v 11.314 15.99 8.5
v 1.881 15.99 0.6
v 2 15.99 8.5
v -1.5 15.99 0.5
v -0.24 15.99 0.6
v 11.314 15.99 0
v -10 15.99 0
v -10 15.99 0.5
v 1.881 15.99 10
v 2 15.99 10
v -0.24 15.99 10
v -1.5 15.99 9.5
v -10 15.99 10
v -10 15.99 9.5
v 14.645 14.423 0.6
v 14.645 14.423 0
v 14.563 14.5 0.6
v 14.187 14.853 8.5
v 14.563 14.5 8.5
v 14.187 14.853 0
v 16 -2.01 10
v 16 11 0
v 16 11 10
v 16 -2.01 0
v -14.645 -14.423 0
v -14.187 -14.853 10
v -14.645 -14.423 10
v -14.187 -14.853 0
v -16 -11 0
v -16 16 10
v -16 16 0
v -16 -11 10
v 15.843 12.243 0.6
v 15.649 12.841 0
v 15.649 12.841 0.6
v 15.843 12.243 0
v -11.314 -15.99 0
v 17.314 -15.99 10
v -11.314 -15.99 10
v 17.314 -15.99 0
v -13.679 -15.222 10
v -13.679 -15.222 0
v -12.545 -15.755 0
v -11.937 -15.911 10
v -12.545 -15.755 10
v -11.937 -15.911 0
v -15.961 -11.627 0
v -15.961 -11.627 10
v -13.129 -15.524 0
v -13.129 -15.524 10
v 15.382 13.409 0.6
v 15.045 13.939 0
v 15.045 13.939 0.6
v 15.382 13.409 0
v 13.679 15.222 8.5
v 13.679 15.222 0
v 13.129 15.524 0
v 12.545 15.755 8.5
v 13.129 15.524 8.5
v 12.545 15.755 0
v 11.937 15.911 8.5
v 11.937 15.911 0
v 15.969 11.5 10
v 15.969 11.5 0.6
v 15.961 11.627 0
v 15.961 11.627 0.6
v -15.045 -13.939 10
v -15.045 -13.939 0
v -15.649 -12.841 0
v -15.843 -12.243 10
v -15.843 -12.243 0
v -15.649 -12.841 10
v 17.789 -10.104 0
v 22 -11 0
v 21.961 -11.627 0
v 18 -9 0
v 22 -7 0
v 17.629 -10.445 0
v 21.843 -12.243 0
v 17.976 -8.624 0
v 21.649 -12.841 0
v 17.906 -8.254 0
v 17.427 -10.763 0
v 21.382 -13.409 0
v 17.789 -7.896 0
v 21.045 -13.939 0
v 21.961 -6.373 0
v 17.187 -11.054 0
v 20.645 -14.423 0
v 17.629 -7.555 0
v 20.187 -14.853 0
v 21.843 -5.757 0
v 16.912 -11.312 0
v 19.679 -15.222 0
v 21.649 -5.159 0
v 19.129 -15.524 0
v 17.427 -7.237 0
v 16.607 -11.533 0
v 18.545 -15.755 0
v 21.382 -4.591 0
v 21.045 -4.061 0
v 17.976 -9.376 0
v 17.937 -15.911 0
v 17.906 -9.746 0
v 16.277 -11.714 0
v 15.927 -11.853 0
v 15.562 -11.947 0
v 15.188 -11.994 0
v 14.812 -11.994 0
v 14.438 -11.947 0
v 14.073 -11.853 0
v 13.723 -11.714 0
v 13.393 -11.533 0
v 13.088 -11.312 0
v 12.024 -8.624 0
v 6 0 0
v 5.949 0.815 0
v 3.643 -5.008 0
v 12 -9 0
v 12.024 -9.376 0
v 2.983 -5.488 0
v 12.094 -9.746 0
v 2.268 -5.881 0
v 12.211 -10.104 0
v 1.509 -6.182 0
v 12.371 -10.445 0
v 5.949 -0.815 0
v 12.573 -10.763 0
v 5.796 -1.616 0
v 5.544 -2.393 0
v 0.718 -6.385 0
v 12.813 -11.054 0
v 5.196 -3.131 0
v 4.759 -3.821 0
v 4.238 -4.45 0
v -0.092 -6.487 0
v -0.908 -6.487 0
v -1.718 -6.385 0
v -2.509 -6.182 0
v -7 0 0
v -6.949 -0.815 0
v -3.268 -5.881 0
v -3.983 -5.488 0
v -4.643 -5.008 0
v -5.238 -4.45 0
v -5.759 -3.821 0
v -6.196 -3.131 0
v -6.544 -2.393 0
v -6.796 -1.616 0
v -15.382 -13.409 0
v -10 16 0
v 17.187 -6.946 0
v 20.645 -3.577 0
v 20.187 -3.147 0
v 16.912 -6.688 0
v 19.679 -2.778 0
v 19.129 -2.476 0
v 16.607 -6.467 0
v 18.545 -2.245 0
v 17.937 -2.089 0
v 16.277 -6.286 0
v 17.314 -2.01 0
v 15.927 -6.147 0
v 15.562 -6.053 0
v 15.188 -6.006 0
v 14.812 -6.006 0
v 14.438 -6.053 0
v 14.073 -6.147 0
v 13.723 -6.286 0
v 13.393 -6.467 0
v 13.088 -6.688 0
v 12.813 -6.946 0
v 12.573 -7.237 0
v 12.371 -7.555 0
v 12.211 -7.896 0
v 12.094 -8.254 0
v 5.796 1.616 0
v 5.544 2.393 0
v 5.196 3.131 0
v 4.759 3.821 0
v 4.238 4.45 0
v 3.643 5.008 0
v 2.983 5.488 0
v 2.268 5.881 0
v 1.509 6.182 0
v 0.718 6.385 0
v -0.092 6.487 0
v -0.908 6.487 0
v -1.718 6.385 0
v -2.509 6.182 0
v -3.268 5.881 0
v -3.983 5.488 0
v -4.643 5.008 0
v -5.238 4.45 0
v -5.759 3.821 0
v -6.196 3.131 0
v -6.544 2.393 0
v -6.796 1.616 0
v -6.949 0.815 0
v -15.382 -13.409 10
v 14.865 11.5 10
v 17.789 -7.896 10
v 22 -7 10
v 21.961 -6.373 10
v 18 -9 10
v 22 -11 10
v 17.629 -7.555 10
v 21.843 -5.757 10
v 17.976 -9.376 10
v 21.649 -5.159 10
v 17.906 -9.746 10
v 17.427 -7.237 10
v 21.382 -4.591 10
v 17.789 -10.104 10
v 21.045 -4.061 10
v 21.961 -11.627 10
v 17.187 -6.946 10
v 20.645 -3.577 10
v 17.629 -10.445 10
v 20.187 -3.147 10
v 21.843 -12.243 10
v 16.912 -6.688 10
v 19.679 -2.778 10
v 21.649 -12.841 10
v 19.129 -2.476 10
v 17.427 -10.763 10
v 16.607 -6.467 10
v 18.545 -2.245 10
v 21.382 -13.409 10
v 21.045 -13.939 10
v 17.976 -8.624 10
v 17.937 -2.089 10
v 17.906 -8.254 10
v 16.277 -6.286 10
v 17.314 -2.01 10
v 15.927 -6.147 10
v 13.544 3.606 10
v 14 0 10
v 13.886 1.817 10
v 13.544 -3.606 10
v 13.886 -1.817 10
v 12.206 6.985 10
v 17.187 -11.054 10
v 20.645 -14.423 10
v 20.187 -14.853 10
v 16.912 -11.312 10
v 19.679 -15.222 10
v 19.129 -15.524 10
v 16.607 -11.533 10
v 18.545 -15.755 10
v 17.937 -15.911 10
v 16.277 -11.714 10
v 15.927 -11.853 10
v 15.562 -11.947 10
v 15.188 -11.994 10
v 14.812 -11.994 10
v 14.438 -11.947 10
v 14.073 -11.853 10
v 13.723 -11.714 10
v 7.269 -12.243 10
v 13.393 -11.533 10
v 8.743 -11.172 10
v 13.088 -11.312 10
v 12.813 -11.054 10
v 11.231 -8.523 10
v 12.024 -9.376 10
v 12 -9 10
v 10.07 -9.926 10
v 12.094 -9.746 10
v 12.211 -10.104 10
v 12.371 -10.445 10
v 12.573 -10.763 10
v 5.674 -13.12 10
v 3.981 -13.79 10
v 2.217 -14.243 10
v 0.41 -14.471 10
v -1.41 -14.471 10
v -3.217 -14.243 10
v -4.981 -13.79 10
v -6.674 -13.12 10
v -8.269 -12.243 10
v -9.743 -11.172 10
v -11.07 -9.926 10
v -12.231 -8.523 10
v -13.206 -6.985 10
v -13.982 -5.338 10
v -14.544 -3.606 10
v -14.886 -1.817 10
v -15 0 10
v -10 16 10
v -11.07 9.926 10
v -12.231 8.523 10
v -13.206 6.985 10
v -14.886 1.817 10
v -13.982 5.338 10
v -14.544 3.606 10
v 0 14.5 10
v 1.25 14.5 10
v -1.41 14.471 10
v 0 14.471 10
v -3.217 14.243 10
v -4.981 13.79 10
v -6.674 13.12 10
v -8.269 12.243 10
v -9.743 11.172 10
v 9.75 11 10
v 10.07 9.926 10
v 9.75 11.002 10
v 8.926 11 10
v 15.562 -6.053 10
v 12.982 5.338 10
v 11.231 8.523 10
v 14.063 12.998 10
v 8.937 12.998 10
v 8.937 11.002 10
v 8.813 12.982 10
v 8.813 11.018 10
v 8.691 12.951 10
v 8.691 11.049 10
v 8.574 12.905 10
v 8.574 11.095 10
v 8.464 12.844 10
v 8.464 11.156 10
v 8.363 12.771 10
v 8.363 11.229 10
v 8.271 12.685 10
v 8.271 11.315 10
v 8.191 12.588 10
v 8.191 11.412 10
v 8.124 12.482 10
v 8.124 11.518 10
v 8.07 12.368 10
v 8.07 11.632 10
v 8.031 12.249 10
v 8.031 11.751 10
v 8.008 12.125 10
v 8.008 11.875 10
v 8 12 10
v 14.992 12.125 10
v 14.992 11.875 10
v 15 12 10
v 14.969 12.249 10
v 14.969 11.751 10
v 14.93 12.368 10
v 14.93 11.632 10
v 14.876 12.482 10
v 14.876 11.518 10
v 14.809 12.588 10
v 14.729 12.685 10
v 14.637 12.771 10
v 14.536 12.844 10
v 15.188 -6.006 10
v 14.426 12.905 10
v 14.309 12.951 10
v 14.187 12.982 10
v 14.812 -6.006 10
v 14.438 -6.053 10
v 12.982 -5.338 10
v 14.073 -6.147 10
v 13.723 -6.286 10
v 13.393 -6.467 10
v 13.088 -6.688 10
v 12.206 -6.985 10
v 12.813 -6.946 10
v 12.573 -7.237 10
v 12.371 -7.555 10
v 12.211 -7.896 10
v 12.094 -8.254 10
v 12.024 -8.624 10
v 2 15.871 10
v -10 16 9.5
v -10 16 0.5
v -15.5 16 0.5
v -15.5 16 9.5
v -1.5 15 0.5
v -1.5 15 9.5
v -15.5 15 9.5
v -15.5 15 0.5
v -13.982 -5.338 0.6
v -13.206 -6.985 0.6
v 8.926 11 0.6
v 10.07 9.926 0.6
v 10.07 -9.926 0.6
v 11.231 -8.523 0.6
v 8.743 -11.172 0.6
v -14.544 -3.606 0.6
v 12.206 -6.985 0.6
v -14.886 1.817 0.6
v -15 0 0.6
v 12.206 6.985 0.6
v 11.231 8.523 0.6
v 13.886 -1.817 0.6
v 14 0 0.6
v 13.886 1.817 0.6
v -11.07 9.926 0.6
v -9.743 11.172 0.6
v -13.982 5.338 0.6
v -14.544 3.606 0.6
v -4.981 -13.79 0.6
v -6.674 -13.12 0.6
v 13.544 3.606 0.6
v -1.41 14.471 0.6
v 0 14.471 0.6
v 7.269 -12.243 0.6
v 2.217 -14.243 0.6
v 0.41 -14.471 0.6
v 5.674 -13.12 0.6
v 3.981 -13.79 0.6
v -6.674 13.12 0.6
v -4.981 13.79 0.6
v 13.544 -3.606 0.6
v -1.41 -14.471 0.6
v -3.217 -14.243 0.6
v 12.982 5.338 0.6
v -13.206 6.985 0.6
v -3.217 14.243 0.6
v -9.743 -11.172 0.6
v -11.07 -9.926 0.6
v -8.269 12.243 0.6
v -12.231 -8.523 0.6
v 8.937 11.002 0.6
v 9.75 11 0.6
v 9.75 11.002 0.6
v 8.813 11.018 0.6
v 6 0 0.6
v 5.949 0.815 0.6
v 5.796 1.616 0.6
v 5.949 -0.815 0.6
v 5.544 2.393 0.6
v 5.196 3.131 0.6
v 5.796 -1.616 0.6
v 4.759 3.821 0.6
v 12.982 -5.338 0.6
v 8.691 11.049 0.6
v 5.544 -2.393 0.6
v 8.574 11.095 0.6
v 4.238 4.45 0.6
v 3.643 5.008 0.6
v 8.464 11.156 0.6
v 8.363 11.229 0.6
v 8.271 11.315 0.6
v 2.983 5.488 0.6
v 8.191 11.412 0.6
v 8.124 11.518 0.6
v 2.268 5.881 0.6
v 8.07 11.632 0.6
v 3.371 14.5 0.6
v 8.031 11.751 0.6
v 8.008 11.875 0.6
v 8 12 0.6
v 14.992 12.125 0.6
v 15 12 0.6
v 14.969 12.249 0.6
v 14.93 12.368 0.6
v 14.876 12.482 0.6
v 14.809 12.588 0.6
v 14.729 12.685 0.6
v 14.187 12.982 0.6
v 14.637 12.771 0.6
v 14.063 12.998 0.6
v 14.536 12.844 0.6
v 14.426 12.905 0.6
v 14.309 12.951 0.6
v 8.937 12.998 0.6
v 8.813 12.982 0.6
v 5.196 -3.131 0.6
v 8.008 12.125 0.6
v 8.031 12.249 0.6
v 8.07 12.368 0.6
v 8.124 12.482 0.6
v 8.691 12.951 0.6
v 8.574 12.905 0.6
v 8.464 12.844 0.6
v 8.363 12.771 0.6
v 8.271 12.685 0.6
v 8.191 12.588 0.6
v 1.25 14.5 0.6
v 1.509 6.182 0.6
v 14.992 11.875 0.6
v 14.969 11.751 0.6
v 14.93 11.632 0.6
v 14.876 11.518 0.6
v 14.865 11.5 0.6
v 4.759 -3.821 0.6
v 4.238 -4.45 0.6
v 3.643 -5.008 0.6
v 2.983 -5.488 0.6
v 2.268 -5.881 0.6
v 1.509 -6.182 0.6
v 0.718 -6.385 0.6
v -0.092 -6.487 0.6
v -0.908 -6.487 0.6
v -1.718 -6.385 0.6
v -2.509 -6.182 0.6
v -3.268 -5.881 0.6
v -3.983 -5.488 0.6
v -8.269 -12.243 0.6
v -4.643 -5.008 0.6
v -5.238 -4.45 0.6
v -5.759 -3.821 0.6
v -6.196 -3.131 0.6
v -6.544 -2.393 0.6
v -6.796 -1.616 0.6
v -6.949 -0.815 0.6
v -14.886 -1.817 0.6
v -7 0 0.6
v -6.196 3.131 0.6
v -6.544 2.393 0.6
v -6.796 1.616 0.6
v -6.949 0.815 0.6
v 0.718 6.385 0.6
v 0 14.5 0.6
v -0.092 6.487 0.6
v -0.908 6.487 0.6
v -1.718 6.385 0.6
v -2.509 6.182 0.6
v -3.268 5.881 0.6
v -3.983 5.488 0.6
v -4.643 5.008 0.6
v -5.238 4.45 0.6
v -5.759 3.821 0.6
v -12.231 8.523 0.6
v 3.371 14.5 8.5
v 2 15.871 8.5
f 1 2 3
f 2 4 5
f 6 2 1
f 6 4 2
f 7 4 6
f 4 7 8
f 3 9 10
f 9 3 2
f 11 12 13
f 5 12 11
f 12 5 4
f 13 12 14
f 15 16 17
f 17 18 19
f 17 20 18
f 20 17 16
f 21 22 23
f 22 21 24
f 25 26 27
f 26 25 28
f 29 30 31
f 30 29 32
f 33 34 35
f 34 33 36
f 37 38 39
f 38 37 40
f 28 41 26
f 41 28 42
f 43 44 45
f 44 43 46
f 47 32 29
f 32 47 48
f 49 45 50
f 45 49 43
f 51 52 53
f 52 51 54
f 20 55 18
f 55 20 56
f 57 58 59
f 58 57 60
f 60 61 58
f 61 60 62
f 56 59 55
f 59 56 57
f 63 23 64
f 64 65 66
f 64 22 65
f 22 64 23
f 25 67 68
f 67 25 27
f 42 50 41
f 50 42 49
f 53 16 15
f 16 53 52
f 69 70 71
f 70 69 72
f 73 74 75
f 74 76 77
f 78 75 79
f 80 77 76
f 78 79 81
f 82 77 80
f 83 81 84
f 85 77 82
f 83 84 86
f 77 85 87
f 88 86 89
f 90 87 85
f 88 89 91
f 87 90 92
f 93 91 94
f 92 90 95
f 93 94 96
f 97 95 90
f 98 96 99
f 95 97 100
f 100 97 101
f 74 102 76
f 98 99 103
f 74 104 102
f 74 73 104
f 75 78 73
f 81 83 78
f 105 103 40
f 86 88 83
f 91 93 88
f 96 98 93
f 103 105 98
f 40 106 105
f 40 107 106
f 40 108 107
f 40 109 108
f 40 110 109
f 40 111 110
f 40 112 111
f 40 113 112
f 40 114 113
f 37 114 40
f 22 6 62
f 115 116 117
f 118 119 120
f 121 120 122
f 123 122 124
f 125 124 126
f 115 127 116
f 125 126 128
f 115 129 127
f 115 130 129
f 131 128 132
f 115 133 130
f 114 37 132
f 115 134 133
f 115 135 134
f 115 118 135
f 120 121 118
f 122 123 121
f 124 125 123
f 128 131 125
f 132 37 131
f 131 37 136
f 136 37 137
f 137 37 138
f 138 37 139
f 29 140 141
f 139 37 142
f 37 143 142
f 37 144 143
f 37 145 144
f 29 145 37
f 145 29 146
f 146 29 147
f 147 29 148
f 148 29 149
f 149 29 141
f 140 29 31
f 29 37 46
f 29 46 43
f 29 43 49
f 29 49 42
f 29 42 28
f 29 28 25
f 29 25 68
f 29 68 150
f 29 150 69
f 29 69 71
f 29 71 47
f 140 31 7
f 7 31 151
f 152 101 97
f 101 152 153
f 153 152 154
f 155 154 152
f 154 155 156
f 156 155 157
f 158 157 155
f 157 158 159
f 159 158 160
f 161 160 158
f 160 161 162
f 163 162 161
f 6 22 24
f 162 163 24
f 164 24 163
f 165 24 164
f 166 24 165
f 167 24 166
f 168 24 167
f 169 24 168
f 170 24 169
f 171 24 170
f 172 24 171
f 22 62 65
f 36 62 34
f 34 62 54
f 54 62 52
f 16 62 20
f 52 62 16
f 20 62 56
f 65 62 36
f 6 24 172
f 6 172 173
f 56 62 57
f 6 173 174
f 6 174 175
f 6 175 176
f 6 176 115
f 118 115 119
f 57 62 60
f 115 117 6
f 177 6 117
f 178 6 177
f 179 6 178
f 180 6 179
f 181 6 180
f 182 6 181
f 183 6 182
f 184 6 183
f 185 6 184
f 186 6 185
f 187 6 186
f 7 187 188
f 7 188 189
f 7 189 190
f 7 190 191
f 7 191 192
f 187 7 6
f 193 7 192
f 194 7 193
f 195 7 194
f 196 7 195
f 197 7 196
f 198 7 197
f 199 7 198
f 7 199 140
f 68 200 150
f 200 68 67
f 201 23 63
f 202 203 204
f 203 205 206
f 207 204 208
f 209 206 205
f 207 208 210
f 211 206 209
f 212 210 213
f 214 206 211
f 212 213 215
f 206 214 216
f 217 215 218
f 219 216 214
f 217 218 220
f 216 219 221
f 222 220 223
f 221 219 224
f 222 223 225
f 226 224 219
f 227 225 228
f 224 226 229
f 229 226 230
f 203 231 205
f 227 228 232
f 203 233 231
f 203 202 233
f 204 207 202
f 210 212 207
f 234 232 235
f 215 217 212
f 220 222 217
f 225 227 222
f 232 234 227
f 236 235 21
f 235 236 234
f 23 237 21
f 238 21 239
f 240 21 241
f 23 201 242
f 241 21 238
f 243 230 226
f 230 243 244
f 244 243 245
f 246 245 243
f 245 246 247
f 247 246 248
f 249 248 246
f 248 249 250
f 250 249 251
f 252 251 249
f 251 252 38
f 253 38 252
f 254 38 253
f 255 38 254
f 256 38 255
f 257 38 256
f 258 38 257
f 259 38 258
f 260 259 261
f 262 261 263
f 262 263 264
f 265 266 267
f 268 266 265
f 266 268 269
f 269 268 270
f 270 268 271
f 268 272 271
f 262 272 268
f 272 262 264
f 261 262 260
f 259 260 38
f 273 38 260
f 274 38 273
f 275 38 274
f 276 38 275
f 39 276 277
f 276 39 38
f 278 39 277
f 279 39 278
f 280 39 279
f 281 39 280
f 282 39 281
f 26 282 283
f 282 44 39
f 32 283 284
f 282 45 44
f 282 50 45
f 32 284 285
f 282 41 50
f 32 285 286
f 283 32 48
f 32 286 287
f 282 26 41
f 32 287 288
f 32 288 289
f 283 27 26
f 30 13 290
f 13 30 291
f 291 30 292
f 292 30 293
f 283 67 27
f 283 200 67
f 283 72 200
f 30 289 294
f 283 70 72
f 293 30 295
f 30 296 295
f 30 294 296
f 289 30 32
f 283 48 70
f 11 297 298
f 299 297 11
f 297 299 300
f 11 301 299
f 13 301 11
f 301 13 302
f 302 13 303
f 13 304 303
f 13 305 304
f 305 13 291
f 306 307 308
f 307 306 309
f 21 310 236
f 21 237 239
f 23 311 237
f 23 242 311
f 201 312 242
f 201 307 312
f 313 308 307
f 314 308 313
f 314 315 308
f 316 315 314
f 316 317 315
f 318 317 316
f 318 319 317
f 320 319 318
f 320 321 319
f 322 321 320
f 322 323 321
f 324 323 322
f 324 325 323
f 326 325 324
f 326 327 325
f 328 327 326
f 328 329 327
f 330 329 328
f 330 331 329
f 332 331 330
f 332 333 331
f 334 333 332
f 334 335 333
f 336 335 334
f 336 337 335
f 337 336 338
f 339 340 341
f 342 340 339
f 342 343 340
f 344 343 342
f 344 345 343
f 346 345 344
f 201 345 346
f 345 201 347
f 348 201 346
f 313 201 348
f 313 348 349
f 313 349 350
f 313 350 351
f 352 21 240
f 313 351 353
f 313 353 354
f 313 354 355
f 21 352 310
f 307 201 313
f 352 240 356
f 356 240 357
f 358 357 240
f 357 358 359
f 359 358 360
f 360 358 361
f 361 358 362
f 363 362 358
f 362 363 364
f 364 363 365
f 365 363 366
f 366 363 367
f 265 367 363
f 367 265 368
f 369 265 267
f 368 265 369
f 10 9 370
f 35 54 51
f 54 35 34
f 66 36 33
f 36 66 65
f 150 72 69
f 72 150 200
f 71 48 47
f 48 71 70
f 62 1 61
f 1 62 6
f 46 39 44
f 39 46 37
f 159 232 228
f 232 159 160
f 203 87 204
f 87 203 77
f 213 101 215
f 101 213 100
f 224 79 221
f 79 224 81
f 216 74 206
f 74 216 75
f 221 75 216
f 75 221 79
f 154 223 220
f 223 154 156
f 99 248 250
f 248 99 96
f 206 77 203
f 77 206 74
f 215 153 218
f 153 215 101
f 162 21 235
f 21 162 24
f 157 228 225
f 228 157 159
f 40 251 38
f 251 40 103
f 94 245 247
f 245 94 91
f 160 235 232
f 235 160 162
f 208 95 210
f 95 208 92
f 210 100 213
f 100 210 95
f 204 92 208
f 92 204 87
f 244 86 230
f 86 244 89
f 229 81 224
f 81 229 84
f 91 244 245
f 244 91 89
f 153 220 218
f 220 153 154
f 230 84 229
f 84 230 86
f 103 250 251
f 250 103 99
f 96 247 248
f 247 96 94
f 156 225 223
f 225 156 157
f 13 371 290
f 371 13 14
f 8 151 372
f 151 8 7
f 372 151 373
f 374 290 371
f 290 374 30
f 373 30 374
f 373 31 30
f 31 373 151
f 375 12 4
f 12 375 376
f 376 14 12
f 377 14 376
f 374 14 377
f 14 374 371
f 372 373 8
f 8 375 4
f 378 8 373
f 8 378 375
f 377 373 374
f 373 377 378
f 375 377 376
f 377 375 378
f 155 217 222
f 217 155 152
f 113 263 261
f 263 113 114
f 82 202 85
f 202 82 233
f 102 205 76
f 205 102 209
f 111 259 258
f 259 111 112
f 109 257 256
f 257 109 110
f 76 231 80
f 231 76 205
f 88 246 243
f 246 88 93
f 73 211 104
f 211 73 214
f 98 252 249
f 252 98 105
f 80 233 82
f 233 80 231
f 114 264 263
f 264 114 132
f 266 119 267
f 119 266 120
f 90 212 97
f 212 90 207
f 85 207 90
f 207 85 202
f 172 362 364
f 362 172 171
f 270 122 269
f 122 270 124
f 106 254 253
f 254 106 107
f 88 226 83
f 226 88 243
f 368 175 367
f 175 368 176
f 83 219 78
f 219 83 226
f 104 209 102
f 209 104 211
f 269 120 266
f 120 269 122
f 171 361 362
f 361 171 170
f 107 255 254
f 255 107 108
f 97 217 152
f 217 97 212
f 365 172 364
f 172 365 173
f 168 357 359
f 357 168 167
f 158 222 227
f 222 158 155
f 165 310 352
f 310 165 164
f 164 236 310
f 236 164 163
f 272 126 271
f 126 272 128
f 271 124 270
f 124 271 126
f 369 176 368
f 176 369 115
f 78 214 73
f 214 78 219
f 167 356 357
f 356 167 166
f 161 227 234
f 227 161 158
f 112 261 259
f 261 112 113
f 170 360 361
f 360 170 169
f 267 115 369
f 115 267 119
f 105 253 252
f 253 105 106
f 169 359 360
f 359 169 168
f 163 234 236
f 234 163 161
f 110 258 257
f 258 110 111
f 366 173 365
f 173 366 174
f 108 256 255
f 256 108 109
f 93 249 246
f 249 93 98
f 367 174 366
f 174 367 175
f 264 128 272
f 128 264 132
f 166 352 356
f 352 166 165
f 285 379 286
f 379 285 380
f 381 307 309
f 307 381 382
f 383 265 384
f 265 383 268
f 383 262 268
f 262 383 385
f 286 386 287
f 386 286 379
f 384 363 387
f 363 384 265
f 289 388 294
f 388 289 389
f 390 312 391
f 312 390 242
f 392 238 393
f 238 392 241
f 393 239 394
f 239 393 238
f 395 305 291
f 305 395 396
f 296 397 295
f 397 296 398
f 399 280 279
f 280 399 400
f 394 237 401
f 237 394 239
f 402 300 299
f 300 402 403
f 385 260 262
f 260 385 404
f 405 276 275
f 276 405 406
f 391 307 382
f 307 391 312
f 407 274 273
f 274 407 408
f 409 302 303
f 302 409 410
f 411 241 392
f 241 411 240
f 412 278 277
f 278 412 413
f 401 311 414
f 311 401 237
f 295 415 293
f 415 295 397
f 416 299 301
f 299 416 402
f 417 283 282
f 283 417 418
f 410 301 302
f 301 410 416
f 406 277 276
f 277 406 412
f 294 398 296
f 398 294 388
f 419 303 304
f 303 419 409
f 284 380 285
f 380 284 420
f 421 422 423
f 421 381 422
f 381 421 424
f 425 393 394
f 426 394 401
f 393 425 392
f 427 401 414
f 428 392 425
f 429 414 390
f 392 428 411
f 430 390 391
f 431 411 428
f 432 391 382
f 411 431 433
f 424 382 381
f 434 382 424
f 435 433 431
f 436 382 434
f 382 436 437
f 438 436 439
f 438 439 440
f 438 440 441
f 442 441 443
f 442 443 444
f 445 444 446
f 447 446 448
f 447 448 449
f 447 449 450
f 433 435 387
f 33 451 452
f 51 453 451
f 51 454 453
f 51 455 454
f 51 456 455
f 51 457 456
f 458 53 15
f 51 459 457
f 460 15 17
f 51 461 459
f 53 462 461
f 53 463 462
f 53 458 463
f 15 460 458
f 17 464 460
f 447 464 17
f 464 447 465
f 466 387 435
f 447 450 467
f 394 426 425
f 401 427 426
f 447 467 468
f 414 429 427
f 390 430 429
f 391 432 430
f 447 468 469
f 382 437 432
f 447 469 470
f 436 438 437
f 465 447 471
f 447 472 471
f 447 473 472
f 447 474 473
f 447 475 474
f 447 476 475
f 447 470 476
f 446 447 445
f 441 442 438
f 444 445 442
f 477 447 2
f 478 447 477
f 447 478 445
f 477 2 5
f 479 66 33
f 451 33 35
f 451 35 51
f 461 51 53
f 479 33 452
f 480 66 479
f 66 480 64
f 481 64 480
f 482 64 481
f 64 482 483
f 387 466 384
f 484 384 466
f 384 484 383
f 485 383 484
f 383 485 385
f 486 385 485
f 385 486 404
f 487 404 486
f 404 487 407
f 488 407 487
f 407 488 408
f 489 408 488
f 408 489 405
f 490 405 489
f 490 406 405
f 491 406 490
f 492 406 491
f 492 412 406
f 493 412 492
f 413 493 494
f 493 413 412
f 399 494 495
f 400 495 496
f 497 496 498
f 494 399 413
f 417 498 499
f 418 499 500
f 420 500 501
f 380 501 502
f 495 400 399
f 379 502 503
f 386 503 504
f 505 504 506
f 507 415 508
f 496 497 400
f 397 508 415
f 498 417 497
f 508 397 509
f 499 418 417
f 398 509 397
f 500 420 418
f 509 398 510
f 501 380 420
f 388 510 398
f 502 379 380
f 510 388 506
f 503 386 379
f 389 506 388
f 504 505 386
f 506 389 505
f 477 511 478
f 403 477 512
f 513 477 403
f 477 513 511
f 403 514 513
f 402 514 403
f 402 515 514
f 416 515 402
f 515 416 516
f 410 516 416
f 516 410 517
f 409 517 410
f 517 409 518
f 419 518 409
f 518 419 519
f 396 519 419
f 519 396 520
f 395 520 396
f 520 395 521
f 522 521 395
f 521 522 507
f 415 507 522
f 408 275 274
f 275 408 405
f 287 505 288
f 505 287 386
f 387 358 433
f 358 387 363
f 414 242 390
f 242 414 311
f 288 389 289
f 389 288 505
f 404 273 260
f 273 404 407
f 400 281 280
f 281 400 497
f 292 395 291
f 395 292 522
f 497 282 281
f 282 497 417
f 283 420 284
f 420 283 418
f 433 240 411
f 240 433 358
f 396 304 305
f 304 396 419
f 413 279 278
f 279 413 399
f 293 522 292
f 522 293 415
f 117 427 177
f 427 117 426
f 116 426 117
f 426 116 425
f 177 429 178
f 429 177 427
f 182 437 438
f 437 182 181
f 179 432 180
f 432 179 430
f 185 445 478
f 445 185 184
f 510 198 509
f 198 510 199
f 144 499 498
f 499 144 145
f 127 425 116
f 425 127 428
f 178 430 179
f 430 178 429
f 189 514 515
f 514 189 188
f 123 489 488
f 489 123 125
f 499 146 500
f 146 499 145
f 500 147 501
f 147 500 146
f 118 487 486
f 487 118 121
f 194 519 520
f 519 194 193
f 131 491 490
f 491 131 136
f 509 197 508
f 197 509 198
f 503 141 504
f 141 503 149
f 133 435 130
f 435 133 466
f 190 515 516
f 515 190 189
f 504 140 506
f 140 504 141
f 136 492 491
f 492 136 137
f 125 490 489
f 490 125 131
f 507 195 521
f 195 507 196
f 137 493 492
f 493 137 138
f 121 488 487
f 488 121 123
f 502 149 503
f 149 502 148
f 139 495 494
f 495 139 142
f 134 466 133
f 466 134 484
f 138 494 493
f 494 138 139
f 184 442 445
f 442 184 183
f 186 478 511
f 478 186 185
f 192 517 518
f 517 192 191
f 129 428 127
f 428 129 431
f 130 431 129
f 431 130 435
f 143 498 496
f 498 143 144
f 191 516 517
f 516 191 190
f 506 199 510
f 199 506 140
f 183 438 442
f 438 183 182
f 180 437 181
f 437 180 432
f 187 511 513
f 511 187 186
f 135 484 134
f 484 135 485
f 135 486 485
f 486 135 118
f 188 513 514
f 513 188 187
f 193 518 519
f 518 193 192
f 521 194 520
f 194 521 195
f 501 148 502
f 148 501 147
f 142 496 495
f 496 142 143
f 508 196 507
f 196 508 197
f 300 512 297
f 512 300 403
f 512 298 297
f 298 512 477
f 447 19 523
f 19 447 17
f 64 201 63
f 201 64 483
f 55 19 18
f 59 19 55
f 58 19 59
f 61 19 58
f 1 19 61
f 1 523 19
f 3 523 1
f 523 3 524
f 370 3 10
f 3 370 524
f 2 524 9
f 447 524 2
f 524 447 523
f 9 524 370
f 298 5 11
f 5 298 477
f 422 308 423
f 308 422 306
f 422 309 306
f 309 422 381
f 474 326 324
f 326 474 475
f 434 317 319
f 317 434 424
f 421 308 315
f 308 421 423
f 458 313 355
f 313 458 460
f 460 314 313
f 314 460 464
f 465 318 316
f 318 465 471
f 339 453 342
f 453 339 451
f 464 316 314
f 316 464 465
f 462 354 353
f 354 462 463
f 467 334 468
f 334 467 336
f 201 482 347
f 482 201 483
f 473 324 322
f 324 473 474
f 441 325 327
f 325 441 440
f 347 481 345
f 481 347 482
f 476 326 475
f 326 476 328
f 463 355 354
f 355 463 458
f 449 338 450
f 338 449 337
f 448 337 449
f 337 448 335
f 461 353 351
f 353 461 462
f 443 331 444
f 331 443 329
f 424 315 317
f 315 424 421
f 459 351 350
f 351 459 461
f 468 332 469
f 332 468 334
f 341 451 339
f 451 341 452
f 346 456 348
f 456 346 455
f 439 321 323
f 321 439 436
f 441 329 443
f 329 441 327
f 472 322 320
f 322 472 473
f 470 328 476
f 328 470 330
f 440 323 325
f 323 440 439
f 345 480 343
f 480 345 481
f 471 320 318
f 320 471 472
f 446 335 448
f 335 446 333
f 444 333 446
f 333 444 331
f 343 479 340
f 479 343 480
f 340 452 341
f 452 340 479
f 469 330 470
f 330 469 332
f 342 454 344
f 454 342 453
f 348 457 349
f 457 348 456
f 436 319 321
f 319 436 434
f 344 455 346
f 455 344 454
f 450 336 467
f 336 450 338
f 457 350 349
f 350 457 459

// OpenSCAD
$fn = 50;


union() {
	difference() {
		union() {
			translate(v = [0, 0, 0]) {
				rotate(a = [0, 0, 0]) {
					hull() {
						translate(v = [-11.0000000000, 11.0000000000, 0]) {
							rotate(a = [0, 0, 0]) {
								translate(v = [0, 0, 0]) {
									rotate(a = [0, 0, 0]) {
										cylinder(h = 10, r = 5);
									}
								}
							}
						}
						translate(v = [11.0000000000, 11.0000000000, 0]) {
							rotate(a = [0, 0, 0]) {
								translate(v = [0, 0, 0]) {
									rotate(a = [0, 0, 0]) {
										cylinder(h = 10, r = 5);
									}
								}
							}
						}
						translate(v = [-11.0000000000, -11.0000000000, 0]) {
							rotate(a = [0, 0, 0]) {
								translate(v = [0, 0, 0]) {
									rotate(a = [0, 0, 0]) {
										cylinder(h = 10, r = 5);
									}
								}
							}
						}
						translate(v = [11.0000000000, -11.0000000000, 0]) {
							rotate(a = [0, 0, 0]) {
								translate(v = [0, 0, 0]) {
									rotate(a = [0, 0, 0]) {
										cylinder(h = 10, r = 5);
									}
								}
							}
						}
					}
				}
			}
			translate(v = [7.5000000000, -9.0000000000, 0]) {
				rotate(a = [0, 0, 0]) {
					hull() {
						translate(v = [-9.5000000000, 2.0000000000, 0]) {
							rotate(a = [0, 0, 0]) {
								translate(v = [0, 0, 0]) {
									rotate(a = [0, 0, 0]) {
										cylinder(h = 10, r = 5);
									}
								}
							}
						}
						translate(v = [9.5000000000, 2.0000000000, 0]) {
							rotate(a = [0, 0, 0]) {
								translate(v = [0, 0, 0]) {
									rotate(a = [0, 0, 0]) {
										cylinder(h = 10, r = 5);
									}
								}
							}
						}
						translate(v = [-9.5000000000, -2.0000000000, 0]) {
							rotate(a = [0, 0, 0]) {
								translate(v = [0, 0, 0]) {
									rotate(a = [0, 0, 0]) {
										cylinder(h = 10, r = 5);
									}
								}
							}
						}
						translate(v = [9.5000000000, -2.0000000000, 0]) {
							rotate(a = [0, 0, 0]) {
								translate(v = [0, 0, 0]) {
									rotate(a = [0, 0, 0]) {
										cylinder(h = 10, r = 5);
									}
								}
							}
						}
					}
				}
			}
			translate(v = [-16.0000000000, 10.0000000000, 0]) {
				rotate(a = [0, 0, 0]) {
					cube(size = [6, 6, 10]);
				}
			}
		}
		union() {
			translate(v = [-15.5000000000, 15.0000000000, 0.5000000000]) {
				rotate(a = [0, 0, 0]) {
					cube(size = [14, 1, 9.0000000000]);
				}
			}
			translate(v = [15.0000000000, -9.0000000000, -125.0000000000]) {
				rotate(a = [0, 0, 0]) {
					cylinder(h = 250, r = 3.0000000000);
				}
			}
			translate(v = [-0.5000000000, 0.0000000000, 0.6000000000]) {
				rotate(a = [0, 0, 0]) {
					cylinder(h = 12.4000000000, r = 14.5000000000);
				}
			}
			translate(v = [-0.5000000000, 0.0000000000, -5.0000000000]) {
				rotate(a = [0, 0, 0]) {
					cylinder(h = 10, r = 6.5000000000);
				}
			}
			translate(v = [0.0000000000, 11.5000000000, 0.6000000000]) {
				rotate(a = [0, 0, 0]) {
					cube(size = [16.0000000000, 3, 12.4000000000]);
				}
			}
			translate(v = [2.0000000000, 11.5000000000, 8.5000000000]) {
				rotate(a = [0, 0, 0]) {
					cube(size = [14.0000000000, 6, 1.5000000000]);
				}
			}
			translate(v = [-3.0000000000, 18.7500000000, 0.6000000000]) {
				rotate(a = [0, 0, -45]) {
					cube(size = [10, 1.5000000000, 12.4000000000]);
				}
			}
			translate(v = [2.2500000000, 11.0000000000, 0.6000000000]) {
				rotate(a = [0, 0, 0]) {
					cube(size = [7.5000000000, 2, 9.4000000000]);
				}
			}
		}
	}
	union() {
		translate(v = [11.5000000000, 12, 0]) {
			rotate(a = [0, 0, 0]) {
				hull() {
					translate(v = [2.5000000000, 0, 0]) {
						rotate(a = [0, 0, 0]) {
							translate(v = [0, 0, 0]) {
								rotate(a = [0, 0, 0]) {
									cylinder(h = 10, r = 1.0000000000);
								}
							}
						}
					}
					translate(v = [-2.5000000000, 0, 0]) {
						rotate(a = [0, 0, 0]) {
							translate(v = [0, 0, 0]) {
								rotate(a = [0, 0, 0]) {
									cylinder(h = 10, r = 1.0000000000);
								}
							}
						}
					}
				}
			}
		}
	}
}
